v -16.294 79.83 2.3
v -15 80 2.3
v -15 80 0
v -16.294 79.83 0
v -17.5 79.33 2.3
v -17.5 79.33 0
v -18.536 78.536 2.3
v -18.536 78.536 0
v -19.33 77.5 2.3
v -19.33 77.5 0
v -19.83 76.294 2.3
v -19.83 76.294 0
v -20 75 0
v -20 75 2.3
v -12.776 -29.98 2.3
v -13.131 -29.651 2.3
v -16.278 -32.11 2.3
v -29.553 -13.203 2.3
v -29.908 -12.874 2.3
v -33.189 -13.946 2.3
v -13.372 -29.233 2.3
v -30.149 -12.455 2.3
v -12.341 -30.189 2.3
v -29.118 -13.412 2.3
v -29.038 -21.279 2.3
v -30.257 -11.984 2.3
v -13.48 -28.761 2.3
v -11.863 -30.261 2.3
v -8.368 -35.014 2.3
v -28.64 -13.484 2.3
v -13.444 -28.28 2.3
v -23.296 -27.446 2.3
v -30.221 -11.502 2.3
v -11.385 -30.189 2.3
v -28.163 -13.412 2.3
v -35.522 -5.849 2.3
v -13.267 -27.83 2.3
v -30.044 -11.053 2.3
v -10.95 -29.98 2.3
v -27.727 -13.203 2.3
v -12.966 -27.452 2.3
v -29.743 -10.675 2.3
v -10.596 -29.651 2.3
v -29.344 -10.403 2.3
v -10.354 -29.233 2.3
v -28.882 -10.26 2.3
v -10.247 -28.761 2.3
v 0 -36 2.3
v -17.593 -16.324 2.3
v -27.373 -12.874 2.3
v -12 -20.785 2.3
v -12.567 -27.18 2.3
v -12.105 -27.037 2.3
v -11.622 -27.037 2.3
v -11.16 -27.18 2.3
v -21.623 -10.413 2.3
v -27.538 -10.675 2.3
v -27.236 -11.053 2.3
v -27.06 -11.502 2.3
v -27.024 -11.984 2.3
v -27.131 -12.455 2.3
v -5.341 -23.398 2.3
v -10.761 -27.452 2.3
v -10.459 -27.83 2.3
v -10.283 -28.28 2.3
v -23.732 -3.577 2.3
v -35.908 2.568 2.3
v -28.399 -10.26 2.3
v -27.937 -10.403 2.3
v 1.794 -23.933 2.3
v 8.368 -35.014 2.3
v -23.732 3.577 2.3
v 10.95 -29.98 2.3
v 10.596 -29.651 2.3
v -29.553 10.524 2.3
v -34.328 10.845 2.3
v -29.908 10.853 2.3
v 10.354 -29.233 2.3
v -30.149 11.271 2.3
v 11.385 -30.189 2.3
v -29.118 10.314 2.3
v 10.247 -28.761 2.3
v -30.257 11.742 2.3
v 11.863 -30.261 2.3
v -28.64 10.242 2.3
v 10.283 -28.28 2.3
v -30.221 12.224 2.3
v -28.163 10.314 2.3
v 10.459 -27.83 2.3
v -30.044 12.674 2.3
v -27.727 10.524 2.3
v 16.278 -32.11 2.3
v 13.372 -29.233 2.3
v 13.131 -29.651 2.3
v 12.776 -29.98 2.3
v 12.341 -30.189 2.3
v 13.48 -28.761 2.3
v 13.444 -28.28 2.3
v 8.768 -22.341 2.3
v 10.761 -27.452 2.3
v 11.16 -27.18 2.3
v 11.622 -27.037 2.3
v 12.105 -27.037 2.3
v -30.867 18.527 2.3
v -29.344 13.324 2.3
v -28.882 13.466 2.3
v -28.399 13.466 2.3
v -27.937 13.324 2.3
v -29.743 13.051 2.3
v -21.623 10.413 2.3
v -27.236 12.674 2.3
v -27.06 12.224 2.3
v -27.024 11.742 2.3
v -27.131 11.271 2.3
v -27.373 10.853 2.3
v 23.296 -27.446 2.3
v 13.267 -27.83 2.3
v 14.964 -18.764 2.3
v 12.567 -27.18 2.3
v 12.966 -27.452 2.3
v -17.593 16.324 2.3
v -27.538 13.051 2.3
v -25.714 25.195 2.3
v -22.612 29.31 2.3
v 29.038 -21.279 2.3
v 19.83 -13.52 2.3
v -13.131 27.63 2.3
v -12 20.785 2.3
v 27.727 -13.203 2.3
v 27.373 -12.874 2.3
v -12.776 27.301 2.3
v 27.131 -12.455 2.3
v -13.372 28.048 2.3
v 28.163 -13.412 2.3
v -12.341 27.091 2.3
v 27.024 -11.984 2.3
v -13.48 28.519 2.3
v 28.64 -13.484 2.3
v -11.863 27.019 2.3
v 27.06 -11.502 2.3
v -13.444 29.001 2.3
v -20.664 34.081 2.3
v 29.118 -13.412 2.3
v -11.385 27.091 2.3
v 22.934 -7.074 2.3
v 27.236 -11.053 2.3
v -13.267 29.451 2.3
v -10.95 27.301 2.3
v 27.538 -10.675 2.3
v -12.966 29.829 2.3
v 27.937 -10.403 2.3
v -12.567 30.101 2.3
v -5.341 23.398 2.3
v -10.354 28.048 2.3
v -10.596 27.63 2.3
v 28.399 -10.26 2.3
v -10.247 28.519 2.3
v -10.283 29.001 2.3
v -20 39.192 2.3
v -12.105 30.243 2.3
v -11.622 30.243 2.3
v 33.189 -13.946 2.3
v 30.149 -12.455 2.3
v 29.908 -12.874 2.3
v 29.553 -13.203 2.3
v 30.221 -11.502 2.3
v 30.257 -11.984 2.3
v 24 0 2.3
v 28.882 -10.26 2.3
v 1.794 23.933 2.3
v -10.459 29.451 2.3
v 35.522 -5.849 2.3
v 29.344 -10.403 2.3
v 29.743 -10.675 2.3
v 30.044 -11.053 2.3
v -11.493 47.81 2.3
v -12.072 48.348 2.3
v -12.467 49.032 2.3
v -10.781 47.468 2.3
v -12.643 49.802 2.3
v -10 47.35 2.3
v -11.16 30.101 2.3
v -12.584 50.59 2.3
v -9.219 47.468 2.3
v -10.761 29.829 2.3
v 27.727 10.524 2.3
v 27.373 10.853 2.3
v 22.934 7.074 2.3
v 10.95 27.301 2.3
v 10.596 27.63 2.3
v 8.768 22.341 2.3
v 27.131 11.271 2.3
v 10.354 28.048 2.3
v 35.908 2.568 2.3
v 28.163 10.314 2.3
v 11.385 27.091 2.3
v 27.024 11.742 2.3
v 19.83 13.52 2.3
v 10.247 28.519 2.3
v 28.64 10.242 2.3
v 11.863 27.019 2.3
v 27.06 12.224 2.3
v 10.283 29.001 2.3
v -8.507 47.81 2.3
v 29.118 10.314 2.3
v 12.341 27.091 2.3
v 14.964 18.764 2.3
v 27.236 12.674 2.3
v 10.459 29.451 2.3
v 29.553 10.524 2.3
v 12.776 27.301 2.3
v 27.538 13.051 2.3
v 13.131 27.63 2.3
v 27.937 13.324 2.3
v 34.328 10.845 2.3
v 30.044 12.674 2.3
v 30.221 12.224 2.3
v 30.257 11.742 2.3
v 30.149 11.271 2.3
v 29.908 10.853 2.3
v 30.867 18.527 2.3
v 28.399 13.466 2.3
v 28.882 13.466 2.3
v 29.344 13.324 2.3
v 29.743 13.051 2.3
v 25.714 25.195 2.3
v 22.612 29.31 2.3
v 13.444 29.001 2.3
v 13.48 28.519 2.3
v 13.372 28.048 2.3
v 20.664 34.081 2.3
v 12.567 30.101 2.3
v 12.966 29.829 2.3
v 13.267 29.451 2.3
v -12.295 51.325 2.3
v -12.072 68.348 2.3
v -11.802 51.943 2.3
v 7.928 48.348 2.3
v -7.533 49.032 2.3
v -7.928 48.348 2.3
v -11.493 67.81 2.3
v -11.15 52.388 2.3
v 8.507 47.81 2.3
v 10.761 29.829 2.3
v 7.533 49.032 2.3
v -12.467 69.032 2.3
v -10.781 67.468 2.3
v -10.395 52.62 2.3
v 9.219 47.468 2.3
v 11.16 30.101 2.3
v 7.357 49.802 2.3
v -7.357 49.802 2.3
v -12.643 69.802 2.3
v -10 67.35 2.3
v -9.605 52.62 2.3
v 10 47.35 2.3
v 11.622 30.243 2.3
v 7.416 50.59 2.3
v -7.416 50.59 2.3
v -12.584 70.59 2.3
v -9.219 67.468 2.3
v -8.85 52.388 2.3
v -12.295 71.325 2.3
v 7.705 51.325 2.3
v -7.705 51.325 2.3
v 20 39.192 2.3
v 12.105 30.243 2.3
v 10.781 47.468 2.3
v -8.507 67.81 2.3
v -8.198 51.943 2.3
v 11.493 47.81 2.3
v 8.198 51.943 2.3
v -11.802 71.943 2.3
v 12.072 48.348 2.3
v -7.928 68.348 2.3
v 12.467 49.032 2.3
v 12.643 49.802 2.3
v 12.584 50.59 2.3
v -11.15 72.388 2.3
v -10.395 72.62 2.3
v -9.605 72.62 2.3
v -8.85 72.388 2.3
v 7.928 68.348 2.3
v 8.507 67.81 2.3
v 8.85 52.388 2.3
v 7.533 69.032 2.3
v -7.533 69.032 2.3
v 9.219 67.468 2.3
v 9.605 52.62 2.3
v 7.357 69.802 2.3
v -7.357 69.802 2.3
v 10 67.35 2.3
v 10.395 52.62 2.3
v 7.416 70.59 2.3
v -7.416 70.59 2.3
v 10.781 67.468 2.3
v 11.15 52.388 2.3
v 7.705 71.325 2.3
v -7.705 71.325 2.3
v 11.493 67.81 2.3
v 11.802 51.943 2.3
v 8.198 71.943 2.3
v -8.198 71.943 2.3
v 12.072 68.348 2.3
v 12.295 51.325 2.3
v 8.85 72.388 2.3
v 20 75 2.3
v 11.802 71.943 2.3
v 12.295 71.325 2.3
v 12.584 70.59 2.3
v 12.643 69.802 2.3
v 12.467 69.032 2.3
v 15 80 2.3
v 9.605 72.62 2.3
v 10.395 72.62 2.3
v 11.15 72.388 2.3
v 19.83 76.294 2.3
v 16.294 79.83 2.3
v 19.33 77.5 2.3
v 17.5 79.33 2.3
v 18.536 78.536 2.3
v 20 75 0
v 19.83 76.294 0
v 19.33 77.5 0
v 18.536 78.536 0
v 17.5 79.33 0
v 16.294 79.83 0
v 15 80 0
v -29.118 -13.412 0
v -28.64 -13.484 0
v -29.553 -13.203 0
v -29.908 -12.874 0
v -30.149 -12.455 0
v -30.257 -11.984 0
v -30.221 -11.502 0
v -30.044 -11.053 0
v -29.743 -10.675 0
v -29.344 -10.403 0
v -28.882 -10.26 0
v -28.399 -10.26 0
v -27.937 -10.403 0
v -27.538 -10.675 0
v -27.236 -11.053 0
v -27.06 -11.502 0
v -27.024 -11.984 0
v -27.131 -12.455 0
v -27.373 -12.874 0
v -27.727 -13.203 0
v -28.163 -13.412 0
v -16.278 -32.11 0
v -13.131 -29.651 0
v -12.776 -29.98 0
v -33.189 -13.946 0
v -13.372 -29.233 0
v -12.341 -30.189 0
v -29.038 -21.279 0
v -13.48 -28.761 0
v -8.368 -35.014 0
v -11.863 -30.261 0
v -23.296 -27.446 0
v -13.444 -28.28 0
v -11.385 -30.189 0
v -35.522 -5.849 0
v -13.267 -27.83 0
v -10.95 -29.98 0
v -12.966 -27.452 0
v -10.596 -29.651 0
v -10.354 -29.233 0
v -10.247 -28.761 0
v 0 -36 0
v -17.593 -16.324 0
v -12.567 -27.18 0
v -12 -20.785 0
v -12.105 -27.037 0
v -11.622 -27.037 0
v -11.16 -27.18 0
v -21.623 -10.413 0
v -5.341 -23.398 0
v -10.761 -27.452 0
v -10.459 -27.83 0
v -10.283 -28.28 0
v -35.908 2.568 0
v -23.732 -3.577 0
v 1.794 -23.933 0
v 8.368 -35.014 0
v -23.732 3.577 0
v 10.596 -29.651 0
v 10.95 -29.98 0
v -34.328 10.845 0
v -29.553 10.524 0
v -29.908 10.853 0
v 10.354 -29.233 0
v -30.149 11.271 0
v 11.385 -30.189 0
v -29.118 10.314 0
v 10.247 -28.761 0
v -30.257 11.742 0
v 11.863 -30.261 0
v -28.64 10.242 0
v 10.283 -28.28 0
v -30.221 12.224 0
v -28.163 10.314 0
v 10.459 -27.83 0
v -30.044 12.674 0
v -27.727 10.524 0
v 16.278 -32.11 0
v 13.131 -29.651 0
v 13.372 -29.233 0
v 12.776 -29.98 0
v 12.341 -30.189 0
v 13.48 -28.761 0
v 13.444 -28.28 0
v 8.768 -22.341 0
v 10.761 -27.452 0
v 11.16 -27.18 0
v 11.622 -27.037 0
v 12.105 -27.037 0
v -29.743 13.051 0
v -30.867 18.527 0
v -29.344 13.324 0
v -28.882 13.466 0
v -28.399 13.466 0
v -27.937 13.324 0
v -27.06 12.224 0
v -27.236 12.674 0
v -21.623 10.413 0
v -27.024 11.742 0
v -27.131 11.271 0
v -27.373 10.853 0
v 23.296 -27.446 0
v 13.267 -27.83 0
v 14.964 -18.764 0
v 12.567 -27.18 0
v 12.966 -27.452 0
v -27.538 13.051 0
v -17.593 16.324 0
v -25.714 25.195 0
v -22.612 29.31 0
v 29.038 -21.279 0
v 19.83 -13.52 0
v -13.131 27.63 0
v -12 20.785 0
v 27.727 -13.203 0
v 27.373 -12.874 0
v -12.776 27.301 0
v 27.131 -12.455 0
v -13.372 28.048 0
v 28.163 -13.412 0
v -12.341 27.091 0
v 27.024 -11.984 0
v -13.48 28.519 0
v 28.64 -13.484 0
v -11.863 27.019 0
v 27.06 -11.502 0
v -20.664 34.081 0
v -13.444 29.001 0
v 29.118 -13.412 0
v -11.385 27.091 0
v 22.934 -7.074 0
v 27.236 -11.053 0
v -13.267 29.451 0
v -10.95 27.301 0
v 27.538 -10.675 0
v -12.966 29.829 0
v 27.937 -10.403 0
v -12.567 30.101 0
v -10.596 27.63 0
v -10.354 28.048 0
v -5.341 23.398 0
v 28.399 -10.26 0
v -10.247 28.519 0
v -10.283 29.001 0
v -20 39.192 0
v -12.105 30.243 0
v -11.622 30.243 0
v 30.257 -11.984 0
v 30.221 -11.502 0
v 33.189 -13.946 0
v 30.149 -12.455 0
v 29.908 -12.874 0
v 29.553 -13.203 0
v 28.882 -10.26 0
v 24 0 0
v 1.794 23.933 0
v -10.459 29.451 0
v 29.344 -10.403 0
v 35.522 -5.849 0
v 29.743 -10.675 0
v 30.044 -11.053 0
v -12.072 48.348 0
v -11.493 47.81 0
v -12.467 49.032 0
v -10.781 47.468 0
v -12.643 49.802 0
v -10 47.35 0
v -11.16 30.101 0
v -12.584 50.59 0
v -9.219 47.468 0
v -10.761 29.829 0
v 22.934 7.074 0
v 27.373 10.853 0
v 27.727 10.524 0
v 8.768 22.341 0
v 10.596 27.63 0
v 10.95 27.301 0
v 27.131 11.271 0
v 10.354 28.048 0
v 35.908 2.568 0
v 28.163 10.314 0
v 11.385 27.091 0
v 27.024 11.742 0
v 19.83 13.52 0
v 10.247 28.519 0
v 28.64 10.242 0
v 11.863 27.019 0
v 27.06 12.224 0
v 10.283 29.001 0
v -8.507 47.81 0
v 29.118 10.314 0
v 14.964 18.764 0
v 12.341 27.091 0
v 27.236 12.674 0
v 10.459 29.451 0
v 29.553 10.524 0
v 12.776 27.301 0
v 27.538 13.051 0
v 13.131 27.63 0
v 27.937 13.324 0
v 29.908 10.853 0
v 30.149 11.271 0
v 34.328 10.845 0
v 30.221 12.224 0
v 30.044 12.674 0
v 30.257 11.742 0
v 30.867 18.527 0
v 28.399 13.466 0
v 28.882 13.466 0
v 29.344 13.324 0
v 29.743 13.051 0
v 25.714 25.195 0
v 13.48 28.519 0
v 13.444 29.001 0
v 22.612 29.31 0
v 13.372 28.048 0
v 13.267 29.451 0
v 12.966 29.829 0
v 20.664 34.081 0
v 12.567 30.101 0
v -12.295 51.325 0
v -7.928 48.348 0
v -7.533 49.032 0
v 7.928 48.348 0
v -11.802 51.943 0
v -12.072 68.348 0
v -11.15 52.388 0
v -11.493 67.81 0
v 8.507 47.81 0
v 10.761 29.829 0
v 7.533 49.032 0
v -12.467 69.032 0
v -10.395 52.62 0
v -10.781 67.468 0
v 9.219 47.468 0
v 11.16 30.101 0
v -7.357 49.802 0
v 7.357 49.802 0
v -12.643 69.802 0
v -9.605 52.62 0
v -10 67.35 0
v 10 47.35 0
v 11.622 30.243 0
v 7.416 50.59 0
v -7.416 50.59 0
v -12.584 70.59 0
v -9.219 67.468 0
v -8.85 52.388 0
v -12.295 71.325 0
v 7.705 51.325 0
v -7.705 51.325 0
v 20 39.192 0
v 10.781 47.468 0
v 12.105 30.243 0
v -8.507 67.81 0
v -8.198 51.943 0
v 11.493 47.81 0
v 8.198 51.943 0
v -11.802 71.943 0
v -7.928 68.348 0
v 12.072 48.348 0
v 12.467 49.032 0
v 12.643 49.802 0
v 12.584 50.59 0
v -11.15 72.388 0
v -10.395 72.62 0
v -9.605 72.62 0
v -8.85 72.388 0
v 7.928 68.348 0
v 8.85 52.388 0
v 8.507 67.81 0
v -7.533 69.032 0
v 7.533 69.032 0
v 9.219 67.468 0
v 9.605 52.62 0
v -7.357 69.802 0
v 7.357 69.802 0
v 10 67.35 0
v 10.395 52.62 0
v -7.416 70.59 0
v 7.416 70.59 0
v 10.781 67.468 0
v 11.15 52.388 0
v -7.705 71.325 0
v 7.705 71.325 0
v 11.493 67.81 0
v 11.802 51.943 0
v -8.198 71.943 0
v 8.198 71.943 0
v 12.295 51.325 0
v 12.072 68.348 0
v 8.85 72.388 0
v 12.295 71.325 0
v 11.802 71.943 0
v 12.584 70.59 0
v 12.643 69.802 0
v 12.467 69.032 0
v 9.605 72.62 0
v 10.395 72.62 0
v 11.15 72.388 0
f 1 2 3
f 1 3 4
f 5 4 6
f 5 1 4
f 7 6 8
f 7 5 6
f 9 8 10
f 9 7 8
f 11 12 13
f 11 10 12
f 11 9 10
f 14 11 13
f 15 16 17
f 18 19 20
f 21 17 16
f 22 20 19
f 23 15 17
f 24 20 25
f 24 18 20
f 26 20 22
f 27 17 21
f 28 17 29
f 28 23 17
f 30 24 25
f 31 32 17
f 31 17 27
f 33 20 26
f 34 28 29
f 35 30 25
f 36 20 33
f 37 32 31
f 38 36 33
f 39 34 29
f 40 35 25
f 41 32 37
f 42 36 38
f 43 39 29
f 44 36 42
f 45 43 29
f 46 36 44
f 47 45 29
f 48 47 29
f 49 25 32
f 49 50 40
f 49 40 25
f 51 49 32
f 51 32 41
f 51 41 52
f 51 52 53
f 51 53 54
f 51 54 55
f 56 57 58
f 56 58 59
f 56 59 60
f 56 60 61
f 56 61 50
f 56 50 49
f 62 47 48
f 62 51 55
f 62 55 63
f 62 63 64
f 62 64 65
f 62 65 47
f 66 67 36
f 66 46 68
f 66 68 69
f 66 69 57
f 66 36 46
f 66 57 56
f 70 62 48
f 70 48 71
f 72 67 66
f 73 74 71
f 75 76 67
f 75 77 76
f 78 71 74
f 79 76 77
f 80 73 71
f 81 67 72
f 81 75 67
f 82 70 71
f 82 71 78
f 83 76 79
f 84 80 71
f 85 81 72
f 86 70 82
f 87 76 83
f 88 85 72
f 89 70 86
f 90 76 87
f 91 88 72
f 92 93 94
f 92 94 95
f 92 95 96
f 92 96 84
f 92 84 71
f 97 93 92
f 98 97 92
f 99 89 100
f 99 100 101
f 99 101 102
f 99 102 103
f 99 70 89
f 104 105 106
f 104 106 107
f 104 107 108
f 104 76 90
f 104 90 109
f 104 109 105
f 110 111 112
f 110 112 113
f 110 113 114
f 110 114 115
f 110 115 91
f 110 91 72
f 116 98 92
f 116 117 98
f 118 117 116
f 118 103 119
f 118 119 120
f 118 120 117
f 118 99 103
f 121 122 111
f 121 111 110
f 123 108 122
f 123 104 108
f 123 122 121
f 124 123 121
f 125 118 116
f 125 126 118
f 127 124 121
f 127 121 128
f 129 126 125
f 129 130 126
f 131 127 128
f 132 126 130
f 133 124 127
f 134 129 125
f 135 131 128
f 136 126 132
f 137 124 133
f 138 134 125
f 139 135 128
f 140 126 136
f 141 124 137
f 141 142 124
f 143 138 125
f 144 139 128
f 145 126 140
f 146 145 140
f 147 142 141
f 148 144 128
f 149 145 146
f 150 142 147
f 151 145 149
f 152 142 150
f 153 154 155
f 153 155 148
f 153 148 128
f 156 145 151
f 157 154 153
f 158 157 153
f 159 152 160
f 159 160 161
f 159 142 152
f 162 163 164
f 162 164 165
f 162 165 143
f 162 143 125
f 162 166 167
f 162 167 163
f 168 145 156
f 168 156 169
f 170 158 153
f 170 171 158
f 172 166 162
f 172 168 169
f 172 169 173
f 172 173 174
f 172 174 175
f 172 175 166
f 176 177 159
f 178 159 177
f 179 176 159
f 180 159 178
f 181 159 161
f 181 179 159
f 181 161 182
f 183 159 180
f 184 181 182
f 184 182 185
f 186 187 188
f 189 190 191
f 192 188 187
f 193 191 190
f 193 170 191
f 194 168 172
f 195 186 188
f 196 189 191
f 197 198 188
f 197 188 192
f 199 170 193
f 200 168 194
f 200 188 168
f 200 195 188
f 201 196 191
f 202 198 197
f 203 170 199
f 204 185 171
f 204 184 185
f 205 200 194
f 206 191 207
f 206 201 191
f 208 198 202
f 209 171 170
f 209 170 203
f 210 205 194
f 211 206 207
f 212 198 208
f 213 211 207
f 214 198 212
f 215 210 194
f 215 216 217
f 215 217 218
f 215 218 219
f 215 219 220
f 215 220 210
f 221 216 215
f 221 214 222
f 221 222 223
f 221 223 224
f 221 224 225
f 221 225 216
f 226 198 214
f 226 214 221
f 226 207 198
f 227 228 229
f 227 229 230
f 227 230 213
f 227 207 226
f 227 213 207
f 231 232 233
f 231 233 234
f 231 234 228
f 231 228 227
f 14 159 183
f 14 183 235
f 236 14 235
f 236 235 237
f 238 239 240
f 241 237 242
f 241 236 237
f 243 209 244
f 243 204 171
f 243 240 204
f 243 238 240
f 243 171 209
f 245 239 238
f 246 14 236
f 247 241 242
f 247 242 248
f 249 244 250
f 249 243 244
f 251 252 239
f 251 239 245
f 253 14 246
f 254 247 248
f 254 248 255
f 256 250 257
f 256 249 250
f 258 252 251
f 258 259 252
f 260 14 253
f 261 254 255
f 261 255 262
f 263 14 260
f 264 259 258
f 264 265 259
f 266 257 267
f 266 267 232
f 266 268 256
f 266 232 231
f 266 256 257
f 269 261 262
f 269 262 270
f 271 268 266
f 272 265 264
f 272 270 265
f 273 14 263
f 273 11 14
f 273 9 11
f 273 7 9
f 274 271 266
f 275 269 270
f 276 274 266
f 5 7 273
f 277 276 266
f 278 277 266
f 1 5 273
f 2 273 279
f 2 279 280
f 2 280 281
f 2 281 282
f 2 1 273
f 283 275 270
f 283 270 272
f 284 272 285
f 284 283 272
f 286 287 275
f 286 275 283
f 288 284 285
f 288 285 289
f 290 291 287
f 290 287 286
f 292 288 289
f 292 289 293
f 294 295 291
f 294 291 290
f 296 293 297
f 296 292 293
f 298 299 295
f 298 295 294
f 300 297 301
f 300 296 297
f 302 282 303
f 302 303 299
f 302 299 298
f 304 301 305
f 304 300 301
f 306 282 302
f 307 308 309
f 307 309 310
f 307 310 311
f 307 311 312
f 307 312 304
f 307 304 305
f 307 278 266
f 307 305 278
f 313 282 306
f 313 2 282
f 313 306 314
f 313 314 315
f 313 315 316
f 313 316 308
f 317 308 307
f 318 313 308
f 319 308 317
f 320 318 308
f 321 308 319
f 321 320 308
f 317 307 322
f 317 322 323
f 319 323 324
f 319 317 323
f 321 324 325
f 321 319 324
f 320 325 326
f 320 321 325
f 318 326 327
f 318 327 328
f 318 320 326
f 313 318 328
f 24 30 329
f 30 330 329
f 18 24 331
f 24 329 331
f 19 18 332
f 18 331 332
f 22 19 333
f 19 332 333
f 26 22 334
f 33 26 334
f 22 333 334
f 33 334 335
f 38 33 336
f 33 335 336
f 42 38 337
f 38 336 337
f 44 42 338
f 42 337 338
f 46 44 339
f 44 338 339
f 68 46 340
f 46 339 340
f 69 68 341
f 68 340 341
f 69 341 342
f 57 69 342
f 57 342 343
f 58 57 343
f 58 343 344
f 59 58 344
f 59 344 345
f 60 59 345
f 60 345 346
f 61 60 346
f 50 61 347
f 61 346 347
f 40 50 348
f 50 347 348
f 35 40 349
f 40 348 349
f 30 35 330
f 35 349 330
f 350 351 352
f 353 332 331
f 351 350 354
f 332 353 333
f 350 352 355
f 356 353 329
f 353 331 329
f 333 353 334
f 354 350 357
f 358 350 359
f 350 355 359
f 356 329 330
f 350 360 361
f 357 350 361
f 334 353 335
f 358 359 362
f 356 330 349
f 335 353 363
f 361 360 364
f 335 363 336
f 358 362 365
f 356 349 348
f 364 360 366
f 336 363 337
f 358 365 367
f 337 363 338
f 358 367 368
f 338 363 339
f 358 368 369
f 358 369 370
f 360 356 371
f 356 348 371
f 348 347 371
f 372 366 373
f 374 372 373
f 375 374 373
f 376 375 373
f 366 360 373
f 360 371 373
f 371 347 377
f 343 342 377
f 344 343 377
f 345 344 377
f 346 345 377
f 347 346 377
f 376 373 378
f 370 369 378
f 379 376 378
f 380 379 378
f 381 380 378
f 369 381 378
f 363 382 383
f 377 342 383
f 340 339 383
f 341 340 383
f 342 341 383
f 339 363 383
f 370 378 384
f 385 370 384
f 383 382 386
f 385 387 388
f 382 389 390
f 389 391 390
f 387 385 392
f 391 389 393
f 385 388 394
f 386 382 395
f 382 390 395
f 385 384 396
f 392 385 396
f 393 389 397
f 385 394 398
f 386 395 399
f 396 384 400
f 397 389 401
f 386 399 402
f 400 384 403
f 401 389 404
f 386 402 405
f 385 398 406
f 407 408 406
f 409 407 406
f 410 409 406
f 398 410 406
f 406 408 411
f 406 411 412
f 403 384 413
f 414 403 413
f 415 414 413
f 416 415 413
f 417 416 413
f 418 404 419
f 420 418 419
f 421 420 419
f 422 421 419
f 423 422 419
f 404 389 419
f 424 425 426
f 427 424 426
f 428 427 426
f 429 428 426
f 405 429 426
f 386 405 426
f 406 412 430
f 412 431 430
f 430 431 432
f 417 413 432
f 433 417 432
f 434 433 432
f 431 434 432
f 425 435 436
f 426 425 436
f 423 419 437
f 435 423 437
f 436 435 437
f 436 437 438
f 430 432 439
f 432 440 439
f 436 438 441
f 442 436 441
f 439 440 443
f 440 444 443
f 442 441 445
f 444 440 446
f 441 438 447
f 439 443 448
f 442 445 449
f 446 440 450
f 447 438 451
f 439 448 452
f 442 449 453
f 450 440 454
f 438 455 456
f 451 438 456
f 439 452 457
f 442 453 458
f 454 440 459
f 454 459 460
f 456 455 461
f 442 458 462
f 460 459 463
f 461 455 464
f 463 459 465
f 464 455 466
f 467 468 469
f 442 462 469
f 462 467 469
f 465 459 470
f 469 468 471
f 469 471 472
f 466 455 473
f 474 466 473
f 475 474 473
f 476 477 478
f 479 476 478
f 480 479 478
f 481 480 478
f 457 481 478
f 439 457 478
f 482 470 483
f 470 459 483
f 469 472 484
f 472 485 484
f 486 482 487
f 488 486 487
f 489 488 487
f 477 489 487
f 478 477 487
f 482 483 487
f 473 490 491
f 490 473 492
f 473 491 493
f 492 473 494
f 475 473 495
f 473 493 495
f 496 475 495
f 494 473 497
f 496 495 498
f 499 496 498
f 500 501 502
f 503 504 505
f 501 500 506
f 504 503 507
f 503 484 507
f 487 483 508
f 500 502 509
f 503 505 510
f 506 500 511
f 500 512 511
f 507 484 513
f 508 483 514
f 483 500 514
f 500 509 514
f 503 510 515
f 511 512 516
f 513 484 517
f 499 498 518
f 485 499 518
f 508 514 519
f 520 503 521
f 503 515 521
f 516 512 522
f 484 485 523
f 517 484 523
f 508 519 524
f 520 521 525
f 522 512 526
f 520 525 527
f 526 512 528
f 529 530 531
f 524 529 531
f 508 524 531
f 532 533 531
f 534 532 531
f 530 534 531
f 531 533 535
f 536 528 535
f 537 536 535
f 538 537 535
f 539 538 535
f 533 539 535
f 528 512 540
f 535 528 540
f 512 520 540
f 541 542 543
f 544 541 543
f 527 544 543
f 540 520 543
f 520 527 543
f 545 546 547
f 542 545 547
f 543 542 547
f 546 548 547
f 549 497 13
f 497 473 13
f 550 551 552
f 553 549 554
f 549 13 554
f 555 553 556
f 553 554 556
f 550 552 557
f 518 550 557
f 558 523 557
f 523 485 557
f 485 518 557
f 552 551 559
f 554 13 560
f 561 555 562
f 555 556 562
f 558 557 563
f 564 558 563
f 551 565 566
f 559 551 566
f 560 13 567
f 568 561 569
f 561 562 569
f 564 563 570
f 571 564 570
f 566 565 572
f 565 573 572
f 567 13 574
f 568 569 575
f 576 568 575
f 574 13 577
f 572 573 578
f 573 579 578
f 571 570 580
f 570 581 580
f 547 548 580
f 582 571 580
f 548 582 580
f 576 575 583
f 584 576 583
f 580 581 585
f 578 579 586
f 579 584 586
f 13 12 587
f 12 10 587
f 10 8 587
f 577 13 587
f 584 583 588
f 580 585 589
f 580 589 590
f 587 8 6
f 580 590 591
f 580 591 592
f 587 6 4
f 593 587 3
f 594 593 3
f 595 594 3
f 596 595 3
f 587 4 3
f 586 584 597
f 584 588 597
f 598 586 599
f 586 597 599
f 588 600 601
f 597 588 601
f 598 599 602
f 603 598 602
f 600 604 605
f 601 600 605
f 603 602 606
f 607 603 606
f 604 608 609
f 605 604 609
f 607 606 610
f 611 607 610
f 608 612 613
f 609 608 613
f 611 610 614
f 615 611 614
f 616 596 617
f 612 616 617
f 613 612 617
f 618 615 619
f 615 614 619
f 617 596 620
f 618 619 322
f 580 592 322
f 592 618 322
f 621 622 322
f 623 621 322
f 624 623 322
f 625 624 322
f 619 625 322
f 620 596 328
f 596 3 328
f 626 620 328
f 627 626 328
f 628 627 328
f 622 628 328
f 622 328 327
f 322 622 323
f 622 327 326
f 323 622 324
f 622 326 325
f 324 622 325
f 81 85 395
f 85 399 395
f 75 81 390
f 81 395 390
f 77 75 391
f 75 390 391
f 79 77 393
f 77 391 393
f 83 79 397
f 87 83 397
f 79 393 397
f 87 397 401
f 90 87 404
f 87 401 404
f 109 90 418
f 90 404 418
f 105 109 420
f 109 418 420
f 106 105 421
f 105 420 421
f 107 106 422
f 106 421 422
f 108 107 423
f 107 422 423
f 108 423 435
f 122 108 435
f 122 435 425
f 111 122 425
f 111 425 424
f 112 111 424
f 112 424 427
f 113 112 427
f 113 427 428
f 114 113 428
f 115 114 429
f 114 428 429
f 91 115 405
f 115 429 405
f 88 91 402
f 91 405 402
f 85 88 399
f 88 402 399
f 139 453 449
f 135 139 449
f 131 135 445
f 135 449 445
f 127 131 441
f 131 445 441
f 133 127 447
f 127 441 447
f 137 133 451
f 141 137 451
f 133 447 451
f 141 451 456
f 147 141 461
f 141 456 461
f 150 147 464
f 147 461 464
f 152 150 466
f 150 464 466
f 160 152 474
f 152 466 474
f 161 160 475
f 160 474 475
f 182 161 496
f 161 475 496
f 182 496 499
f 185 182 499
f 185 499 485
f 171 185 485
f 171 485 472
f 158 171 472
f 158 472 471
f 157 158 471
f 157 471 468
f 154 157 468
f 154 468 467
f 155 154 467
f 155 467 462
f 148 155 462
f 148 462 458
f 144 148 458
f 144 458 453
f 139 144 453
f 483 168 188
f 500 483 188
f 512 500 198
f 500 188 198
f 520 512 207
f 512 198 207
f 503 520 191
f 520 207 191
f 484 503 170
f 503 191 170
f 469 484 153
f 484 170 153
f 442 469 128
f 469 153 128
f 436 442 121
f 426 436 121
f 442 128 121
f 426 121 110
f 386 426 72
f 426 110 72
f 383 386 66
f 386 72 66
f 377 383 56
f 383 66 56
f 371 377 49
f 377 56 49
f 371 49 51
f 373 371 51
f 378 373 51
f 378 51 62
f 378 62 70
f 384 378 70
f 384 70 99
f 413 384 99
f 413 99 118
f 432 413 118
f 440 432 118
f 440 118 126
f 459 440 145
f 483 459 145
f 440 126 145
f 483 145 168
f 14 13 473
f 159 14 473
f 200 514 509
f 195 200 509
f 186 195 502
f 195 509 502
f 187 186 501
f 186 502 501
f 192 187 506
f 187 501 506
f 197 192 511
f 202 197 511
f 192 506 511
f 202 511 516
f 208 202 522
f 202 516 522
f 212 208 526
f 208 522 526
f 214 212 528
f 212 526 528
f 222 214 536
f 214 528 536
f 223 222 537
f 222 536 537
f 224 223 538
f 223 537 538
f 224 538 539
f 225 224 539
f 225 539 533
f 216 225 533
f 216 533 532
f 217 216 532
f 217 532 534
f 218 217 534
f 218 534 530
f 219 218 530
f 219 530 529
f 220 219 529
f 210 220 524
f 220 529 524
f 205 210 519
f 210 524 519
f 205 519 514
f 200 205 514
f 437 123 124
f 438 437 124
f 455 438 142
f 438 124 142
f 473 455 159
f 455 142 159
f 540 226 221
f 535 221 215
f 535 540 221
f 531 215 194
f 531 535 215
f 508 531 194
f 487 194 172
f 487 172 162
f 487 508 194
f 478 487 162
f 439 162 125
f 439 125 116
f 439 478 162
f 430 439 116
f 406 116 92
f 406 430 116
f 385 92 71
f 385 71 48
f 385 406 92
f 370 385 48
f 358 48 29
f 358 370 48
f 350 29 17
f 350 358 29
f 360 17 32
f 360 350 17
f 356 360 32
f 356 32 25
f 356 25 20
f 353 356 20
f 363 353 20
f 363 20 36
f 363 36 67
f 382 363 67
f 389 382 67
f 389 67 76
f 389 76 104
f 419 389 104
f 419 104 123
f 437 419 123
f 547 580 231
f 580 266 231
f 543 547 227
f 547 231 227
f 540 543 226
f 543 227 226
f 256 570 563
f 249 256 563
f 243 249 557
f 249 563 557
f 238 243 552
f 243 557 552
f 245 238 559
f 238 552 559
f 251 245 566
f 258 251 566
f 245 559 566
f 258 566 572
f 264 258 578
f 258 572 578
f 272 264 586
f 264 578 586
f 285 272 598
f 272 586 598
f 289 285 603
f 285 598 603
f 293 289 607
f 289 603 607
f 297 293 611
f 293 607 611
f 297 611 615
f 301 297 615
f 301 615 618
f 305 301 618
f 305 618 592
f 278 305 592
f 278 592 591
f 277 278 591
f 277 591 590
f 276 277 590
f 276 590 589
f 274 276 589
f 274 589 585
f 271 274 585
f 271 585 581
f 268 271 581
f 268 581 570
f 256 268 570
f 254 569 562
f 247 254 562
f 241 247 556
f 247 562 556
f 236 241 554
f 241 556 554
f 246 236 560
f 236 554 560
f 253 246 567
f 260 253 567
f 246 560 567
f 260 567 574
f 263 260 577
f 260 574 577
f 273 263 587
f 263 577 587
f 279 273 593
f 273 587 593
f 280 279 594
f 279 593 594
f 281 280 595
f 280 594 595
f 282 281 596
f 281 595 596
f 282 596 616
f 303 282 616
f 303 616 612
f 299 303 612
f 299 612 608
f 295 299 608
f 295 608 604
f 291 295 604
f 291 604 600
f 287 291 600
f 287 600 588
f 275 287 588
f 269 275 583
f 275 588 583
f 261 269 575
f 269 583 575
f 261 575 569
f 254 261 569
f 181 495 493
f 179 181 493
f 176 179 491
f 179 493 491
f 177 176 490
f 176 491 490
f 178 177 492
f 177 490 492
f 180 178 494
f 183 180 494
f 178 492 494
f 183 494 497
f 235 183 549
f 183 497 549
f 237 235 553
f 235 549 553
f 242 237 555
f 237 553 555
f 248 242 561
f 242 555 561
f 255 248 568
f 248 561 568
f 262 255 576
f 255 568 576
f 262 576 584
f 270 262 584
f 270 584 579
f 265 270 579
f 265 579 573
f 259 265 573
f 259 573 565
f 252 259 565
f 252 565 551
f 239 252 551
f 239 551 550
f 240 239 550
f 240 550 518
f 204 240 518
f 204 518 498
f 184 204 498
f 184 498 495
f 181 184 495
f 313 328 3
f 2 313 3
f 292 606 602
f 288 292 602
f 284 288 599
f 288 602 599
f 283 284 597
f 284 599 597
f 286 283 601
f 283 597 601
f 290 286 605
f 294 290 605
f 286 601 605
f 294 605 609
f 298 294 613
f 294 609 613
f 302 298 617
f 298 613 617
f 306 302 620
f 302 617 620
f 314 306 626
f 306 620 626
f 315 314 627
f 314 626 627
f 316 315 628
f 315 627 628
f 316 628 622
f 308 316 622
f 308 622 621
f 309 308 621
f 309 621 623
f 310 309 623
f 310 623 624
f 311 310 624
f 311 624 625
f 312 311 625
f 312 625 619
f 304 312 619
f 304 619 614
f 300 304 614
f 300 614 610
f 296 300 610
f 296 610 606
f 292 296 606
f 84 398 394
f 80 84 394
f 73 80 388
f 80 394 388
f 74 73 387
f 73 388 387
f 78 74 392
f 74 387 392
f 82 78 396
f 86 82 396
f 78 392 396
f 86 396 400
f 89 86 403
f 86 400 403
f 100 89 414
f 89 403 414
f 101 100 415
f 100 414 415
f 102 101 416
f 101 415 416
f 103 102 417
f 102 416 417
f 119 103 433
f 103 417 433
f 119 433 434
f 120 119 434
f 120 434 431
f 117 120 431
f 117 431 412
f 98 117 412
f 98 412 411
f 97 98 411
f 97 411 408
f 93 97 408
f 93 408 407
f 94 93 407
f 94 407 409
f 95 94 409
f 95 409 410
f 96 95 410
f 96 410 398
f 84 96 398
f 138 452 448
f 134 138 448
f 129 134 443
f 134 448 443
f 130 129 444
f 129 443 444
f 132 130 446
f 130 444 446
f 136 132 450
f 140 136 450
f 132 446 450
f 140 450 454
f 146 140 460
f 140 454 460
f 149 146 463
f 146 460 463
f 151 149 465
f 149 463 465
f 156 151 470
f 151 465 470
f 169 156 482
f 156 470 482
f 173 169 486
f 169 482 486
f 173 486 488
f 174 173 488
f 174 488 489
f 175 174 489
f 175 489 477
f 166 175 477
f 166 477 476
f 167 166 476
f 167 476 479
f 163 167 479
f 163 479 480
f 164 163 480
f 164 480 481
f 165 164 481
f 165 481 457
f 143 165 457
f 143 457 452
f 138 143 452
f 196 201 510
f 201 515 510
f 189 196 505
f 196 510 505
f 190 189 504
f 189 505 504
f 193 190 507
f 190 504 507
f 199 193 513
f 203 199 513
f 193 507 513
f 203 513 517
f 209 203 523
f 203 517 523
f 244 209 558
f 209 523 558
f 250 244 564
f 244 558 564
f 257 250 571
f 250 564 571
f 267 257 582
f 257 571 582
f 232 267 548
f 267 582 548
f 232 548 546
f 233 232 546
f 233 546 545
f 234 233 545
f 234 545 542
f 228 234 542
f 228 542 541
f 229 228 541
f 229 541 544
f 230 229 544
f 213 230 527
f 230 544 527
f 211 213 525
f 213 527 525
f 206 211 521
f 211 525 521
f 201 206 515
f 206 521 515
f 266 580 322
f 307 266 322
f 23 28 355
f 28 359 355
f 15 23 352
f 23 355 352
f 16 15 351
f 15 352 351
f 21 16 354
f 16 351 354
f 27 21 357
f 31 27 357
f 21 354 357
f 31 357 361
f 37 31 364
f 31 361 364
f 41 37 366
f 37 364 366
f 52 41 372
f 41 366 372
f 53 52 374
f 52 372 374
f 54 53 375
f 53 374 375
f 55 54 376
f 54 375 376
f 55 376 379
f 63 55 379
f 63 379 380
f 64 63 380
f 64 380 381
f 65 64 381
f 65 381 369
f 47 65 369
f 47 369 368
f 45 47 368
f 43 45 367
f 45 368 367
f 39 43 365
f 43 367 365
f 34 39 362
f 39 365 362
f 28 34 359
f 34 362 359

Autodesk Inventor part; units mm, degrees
ref_plane "YZ Plane" through (0, 0, 0) normal (1, 0, 0) x (0, 1, 0)
ref_plane "XZ Plane" through (0, 0, 0) normal (0, 1, 0) x (-1, 0, 0)
ref_plane "XY Plane" through (0, 0, 0) normal (0, 0, 1) x (1, 0, 0)
sketch "スケッチ1" plane through (0, 0, 0) normal (0, 0, 1) x (1, 0, 0)
  arc A0 (-20, 29.9333) -> (20, 29.9333) centre (0, 0) ccw
  line L0 (-20, -80) -> (20, -80)
  line L1 (20, -80) -> (20, 80)
  line L2 (20, 80) -> (-20, 80)
  line L3 (-20, 80) -> (-20, -80)
  line L4 (-20, -80) -> (20, 80) construction
  line L5 (20, -80) -> (-20, 80) construction
  dimension "d0" = 72
  dimension "d1" = 80
  dimension "d2" = 40
extrude "プレート1" add sketch "スケッチ1" along normal blind 2.3 contours L3 A0 | L3 L2 L1 A0 | L1 A0
sketch "スケッチ2" plane through (0, 0, 2.3) normal (0, 0, 1) x (1, 0, 0)
  circle A0 centre (0, 0) radius 31
  point P0 (-28.6403, -11.8632)
  point P1 (-11.8632, -28.6403)
  point P2 (11.8632, -28.6403)
  point P3 (28.6403, -11.8632)
  point P4 (28.6403, 11.8632)
  point P5 (11.8632, 28.6403)
  point P6 (-11.8632, 28.6403)
  point P7 (-28.6403, 11.8632)
  dimension "d5" = 62
  dimension "d8" = 360
  dimension "d34" = 0
hole "穴1" at (-28.6403, 11.8632, 2.3) at (-11.8632, 28.6403, 2.3) at (11.8632, 28.6403, 2.3) at (28.6403, 11.8632, 2.3) at (28.6403, -11.8632, 2.3) at (11.8632, -28.6403, 2.3) at (-11.8632, -28.6403, 2.3) at (-28.6403, -11.8632, 2.3) direction (0, 0, -1) diameter 3.242 end through all thread size "M4x0.7" class "6H" standard "ANSI Metric M Profile"
sketch "スケッチ4" plane through (0, 0, 2.3) normal (0, 0, 1) x (1, 0, 0)
  line L0 (10, 50) -> (-10, 50)
  line L1 (-10, 50) -> (-10, 70)
  line L2 (-10, 70) -> (10, 70)
  line L3 (10, 70) -> (10, 50)
  line L4 (10, 50) -> (-10, 70) construction
  line L5 (-10, 50) -> (10, 70) construction
  line L6 (-20, 80) -> (20, 80) projected
  circle A0 centre (0, 0) radius 72.5
  point P0 (0, 60)
  point P1 (0, 60)
  dimension "d21" = 20
  dimension "d22" = 10
  dimension "d33" = 145
  dimension "d38" = 20
hole "穴2" at (-10, 70, 2.3) at (10, 70, 2.3) at (-10, 50, 2.3) at (10, 50, 2.3) direction (0, 0, -1) diameter 5.3 end through all clearance for "Socket Head Cap Screw" size "M5" standard "Ansi Metric M Profile"
fillet "コーナーR2" radius 5 2 edges at (-20, 80, 1.15) (20, 80, 1.15)
sketch "スケッチ5" plane through (0, 0, 2.3) normal (0, 0, 1) x (1, 0, 0)
  circle A0 centre (0, 0) radius 24
  dimension "d35" = 48
extrude "押し出し2" cut sketch "スケッチ5" against normal blind 10
fillet "コーナーR3" radius 20 2 edges at (20, 29.9333, 1.15) (-20, 29.9333, 1.15)
equation "\"d16\" = Thickness"
equation "\"d3\" = Thickness"
equation "\"BendRadius\" = Thickness"
equation "\"BendReliefWidth\" = Thickness"
equation "\"BendReliefDepth\" = 0.5 * Thickness"
equation "\"CornerReliefSize\" = 4 * Thickness"
equation "\"MinimumRemnant\" = 2 * Thickness"
equation "\"TransitionRadius\" = BendRadius"
equation "\"JacobiRadiusSize\" = BendRadius"
equation "\"GapSize\" = Thickness"
equation "\"Thickness\" = 2.3"
properties part number "scara-plate9" material "鋼、炭素鋼"
